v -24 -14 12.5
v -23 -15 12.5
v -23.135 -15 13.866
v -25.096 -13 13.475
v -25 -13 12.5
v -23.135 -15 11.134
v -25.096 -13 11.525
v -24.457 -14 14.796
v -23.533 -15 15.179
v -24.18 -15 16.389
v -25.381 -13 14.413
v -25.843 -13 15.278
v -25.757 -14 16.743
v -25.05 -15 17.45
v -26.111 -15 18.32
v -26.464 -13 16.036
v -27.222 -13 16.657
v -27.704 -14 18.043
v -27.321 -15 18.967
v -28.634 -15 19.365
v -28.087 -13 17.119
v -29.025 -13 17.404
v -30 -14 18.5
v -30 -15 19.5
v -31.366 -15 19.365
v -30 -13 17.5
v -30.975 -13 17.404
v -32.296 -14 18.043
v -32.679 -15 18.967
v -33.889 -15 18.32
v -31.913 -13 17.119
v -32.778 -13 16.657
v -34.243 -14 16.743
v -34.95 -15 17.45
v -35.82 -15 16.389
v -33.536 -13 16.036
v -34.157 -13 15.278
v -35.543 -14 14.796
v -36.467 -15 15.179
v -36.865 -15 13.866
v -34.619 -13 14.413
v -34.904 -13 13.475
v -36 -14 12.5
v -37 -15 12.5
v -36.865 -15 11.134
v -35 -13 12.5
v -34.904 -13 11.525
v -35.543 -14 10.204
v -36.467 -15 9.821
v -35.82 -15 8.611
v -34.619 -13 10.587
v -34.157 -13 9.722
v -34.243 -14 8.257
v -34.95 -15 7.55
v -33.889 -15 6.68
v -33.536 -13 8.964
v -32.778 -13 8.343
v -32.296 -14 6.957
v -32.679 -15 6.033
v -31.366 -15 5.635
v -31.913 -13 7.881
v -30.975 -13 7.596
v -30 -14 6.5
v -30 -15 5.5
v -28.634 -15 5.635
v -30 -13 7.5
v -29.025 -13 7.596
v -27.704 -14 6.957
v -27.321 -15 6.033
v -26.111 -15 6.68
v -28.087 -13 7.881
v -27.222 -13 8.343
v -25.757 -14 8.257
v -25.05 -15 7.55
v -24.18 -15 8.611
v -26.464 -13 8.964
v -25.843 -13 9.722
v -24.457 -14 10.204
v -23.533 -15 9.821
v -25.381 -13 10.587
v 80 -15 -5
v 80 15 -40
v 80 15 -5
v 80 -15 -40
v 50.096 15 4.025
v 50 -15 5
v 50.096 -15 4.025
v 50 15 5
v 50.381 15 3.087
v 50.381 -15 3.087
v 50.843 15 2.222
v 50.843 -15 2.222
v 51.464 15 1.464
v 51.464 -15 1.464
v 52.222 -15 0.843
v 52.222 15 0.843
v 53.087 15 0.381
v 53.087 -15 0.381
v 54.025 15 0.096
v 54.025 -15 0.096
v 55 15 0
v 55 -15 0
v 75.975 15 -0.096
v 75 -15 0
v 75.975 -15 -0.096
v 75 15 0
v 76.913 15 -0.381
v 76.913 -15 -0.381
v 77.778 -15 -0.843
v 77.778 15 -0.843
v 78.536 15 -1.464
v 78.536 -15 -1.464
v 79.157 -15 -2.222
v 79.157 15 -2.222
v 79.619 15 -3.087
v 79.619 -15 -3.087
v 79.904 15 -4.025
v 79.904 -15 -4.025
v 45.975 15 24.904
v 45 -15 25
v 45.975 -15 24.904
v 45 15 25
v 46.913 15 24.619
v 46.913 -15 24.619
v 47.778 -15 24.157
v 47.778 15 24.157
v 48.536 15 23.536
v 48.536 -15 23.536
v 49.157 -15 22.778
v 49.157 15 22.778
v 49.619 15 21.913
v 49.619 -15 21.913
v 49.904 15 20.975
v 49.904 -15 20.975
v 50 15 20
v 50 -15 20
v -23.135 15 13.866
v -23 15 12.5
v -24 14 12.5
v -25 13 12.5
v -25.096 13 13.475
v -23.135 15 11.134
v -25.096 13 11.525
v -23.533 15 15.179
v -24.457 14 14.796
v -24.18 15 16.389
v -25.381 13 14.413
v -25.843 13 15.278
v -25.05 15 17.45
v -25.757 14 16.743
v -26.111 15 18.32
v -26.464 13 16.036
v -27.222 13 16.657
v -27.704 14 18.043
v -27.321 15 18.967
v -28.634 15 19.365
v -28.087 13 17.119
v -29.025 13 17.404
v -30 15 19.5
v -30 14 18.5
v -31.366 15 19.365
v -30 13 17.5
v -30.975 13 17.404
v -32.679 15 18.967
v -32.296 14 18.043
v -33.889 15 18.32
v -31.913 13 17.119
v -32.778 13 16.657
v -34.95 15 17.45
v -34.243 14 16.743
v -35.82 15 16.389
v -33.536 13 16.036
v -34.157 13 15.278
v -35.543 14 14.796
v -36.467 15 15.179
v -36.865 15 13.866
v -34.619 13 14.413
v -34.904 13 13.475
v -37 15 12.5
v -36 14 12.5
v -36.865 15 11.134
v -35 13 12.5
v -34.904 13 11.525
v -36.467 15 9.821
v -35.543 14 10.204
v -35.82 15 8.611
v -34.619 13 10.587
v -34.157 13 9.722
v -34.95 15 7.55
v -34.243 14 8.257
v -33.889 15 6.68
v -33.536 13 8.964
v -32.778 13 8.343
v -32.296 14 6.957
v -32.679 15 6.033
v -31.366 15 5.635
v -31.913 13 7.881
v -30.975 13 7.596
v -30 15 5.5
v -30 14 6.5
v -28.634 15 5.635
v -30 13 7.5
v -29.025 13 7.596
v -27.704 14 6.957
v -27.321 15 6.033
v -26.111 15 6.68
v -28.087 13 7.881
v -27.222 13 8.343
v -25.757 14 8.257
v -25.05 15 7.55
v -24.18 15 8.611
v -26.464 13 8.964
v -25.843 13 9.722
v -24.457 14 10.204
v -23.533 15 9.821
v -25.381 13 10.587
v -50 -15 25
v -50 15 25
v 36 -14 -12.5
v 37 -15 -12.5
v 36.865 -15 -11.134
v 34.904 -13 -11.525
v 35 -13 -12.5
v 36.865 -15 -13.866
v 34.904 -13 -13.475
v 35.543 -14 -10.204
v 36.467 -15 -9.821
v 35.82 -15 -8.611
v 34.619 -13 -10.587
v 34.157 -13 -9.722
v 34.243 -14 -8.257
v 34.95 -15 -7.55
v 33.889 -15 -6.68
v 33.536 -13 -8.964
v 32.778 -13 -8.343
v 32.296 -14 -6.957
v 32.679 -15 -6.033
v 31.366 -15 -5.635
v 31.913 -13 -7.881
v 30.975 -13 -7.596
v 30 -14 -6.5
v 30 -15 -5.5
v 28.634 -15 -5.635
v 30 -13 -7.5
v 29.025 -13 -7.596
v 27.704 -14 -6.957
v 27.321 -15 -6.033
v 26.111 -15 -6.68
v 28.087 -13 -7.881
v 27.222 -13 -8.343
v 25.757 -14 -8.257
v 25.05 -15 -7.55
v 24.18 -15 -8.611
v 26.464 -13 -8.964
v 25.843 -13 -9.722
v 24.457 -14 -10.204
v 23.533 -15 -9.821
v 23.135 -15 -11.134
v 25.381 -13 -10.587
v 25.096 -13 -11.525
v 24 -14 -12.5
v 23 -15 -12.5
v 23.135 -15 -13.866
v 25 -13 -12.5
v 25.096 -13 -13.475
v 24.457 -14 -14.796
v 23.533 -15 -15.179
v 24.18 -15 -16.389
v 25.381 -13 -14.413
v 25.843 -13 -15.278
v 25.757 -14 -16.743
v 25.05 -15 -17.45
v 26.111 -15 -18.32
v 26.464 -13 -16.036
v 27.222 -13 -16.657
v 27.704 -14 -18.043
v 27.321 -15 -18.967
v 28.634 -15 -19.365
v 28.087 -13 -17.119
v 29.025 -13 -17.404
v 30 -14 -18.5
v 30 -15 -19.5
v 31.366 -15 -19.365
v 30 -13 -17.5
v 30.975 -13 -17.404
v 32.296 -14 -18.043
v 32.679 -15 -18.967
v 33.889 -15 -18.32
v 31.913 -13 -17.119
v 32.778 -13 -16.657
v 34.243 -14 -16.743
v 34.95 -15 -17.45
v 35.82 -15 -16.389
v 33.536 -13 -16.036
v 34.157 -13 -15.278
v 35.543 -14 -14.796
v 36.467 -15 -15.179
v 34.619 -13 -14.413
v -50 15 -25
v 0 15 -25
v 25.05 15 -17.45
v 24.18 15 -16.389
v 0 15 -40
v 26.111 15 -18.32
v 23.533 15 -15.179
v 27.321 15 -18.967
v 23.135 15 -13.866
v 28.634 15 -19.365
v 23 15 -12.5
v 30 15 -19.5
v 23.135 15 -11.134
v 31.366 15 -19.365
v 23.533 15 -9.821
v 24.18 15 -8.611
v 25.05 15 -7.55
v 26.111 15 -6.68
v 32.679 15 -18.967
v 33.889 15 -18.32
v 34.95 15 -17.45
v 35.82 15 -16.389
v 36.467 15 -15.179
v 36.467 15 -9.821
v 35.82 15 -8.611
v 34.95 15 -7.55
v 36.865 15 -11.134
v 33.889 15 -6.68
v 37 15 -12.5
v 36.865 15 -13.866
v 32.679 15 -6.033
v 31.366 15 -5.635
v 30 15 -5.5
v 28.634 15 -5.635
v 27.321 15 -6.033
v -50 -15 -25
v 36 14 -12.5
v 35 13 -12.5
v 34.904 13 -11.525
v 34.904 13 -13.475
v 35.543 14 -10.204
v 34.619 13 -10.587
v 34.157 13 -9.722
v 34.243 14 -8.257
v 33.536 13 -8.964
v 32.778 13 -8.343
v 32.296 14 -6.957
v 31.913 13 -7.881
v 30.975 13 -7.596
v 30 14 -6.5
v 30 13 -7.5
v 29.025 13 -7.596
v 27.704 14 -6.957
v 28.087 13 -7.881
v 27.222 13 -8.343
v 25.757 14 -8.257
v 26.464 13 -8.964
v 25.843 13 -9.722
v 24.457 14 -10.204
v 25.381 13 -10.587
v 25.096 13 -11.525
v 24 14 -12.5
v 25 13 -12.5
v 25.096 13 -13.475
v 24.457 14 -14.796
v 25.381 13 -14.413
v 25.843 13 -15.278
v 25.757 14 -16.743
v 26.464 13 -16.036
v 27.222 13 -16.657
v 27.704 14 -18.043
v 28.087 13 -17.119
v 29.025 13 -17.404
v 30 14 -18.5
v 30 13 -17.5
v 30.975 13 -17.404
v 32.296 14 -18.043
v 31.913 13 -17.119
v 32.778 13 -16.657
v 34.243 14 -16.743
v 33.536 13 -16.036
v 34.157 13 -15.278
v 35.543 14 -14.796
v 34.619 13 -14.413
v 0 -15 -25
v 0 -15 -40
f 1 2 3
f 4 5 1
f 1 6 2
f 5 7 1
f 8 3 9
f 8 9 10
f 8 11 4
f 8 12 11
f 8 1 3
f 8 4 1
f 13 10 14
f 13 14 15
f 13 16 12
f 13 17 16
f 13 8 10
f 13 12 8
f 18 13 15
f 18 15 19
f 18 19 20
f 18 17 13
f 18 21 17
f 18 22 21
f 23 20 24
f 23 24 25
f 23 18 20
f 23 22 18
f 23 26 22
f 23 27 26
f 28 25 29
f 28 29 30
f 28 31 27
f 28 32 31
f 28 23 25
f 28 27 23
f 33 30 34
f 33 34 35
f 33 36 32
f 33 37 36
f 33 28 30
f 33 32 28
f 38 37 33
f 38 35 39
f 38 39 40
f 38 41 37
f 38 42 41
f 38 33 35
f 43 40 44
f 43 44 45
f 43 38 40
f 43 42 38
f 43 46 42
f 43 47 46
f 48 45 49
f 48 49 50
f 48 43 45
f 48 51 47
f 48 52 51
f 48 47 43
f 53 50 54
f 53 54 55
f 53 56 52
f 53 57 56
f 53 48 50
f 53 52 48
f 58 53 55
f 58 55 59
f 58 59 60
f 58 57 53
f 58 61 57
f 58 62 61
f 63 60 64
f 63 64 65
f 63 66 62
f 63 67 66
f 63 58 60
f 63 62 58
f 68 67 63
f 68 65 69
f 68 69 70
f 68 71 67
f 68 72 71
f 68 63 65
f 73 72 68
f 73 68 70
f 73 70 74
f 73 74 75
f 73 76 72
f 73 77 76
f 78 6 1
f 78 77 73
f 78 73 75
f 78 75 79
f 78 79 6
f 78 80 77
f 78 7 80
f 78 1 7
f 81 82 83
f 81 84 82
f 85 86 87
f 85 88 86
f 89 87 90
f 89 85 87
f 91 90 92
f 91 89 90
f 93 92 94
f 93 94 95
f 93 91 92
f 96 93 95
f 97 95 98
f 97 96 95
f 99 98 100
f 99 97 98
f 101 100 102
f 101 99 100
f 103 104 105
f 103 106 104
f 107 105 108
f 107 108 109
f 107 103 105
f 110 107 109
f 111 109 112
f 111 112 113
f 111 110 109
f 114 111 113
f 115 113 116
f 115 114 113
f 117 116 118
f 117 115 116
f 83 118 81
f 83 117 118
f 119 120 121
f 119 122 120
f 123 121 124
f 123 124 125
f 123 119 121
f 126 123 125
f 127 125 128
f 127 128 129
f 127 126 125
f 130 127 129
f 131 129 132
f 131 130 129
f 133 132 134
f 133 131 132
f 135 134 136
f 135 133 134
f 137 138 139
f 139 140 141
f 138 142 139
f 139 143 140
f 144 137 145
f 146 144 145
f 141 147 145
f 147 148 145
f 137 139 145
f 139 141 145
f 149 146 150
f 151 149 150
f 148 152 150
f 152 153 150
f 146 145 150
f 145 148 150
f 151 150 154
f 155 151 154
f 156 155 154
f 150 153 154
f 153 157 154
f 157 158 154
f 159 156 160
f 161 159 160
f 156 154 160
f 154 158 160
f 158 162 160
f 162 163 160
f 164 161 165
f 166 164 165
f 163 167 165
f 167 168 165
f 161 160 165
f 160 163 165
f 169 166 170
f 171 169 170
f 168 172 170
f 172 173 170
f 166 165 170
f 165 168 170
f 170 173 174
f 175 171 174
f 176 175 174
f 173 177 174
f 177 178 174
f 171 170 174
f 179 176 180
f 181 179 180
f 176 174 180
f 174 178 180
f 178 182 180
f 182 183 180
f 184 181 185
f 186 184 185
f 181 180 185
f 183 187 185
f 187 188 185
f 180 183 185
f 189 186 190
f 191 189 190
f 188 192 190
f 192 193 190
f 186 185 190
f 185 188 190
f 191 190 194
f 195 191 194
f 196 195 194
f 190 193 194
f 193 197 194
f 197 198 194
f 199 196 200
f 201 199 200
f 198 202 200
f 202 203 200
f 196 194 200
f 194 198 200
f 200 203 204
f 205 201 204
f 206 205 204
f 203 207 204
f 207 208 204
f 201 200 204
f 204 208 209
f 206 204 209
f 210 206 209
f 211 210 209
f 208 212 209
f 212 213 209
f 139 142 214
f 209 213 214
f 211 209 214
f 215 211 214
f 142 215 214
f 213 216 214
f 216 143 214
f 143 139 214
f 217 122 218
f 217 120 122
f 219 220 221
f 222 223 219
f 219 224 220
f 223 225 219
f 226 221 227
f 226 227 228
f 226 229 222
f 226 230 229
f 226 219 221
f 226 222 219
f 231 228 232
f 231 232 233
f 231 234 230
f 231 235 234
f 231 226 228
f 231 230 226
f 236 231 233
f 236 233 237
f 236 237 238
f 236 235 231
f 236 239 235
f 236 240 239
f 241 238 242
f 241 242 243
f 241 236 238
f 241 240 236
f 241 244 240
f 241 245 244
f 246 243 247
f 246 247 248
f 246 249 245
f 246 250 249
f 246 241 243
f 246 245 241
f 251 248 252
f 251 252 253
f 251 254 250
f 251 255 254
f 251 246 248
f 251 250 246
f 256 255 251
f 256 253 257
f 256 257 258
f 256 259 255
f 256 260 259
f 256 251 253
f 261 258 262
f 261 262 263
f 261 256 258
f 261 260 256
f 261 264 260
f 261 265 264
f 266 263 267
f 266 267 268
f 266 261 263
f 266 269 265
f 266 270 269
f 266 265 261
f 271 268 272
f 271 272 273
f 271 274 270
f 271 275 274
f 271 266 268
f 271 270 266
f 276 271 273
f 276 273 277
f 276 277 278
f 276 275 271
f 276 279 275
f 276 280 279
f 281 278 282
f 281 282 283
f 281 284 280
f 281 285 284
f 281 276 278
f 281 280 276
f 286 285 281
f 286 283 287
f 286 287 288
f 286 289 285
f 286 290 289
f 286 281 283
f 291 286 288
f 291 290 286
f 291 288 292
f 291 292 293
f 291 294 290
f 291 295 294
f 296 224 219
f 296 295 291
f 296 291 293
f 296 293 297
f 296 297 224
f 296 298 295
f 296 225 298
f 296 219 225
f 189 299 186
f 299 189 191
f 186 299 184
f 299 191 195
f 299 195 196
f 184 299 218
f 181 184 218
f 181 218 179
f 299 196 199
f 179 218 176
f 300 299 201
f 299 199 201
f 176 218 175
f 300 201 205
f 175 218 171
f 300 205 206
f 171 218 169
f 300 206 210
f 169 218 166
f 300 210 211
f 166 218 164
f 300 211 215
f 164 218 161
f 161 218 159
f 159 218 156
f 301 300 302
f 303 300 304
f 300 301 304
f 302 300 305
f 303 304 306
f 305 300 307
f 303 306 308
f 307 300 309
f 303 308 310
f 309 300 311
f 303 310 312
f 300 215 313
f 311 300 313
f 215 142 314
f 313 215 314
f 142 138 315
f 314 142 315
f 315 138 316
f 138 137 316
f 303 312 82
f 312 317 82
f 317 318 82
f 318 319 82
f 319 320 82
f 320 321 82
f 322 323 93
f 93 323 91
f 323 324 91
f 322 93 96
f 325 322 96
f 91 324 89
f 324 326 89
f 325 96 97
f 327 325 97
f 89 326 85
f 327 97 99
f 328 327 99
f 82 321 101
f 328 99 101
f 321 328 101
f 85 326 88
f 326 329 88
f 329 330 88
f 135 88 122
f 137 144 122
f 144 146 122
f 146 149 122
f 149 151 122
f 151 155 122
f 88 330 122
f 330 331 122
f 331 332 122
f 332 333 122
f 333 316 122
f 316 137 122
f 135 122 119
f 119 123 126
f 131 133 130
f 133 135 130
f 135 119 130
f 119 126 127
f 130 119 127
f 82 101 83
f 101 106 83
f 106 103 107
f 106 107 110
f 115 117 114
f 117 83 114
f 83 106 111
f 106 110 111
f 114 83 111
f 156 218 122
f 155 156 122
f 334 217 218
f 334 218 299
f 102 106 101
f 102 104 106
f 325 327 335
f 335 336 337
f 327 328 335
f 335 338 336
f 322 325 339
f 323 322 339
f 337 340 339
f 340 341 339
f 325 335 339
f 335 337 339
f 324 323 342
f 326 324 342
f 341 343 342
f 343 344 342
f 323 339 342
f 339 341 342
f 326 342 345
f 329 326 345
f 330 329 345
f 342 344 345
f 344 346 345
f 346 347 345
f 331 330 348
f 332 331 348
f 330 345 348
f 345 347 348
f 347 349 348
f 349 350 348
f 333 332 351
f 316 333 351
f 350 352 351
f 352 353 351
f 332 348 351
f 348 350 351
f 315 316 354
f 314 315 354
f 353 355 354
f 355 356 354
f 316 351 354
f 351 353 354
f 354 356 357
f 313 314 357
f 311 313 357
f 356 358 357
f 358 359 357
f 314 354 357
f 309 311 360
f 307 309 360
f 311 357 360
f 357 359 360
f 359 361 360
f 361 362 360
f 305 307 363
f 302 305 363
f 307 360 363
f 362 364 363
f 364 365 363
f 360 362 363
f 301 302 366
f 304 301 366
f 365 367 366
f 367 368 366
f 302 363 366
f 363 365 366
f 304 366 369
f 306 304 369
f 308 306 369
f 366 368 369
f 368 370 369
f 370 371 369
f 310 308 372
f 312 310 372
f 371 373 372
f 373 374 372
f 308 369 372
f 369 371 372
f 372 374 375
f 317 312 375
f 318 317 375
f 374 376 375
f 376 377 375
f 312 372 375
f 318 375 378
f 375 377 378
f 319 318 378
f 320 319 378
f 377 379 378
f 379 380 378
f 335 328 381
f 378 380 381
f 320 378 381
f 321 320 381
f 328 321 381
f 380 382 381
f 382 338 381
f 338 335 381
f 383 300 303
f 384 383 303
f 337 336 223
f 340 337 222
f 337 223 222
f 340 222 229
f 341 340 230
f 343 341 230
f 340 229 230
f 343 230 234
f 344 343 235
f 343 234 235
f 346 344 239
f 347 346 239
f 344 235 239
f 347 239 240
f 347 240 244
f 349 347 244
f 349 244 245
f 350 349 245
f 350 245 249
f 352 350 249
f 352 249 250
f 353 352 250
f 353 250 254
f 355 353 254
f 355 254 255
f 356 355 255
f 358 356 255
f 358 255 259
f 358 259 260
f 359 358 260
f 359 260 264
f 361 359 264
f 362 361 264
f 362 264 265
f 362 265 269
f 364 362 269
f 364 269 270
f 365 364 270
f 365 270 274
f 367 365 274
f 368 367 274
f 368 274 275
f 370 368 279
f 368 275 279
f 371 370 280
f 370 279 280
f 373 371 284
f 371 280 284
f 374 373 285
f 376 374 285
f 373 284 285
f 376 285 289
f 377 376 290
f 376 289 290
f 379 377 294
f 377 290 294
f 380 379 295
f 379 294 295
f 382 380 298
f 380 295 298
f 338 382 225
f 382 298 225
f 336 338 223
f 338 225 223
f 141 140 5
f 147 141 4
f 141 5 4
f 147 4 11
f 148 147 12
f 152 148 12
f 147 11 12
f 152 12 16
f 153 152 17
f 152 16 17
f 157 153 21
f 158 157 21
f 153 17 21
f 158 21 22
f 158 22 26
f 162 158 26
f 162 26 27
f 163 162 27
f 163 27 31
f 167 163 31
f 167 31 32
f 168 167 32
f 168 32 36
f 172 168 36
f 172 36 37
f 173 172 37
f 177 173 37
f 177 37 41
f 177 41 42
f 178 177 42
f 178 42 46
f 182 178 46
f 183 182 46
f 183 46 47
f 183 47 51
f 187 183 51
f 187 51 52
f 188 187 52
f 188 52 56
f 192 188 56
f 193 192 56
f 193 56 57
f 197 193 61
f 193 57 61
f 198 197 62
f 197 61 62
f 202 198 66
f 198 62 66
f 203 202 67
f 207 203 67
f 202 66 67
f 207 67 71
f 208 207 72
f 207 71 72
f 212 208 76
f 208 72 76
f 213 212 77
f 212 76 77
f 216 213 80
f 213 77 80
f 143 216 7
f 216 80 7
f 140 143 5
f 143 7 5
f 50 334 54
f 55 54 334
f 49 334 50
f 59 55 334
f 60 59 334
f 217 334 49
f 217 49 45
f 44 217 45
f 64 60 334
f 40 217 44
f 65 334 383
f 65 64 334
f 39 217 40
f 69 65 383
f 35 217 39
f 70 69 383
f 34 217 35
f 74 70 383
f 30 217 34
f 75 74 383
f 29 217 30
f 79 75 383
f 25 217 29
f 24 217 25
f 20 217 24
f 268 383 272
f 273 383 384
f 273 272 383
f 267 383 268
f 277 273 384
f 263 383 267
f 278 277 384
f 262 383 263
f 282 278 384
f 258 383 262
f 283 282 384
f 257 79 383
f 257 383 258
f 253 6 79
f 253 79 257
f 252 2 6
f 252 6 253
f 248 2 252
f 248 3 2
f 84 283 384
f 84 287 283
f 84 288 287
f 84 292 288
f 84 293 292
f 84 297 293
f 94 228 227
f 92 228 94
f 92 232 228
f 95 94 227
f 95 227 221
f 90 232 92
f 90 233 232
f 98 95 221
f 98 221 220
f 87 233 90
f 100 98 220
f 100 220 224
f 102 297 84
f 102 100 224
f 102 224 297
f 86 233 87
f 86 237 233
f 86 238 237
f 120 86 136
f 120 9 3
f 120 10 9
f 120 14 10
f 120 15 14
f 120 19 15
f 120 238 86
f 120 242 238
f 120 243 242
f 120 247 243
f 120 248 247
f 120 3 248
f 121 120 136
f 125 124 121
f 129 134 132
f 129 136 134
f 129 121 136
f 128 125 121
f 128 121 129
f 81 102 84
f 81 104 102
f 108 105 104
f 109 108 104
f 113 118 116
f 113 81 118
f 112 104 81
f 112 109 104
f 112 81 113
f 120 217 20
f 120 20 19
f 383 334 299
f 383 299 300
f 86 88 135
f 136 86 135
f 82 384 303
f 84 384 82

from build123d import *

# Parameters (mm, degrees)
F1_DEPTH = 15
F2_R     = 5
F3_R     = 5
F4_DEPTH = 30.001
F5_SIZE  = 2


with BuildPart() as f1:
    # F0 (on Front) → F1 (new body, symmetric)
    with BuildSketch(Plane.XZ):
        Polygon((50, 25), (-50, 25), (-50, -25), (0, -25), (0, -40), (80, -40), (80, 0), (50, 0), align=None)
    extrude(amount=F1_DEPTH, both=True)

    # F2
    f2_edges = [f1.edges().sort_by_distance(p)[0] for p in [
        (50, 0, 0),
        (50, 0, 25),
        (80, 0, 0),
    ]]
    fillet(f2_edges, radius=F2_R)

    # F3 (on face) → F4 (cut, through all)
    with BuildSketch(Plane.XZ.offset(15)):
        with Locations((-30, 12.5)):
            Circle(F3_R)
        with Locations((30, -12.5)):
            Circle(F3_R)
    extrude(amount=-F4_DEPTH, mode=Mode.SUBTRACT)

    # F5
    f5_edges = [f1.edges().sort_by_distance(p)[0] for p in [
        (-35, -15, 12.5),
        (25, -15, -12.5),
        (-35, 15, 12.5),
        (25, 15, -12.5),
    ]]
    chamfer(f5_edges, length=F5_SIZE)


solid = f1.part
